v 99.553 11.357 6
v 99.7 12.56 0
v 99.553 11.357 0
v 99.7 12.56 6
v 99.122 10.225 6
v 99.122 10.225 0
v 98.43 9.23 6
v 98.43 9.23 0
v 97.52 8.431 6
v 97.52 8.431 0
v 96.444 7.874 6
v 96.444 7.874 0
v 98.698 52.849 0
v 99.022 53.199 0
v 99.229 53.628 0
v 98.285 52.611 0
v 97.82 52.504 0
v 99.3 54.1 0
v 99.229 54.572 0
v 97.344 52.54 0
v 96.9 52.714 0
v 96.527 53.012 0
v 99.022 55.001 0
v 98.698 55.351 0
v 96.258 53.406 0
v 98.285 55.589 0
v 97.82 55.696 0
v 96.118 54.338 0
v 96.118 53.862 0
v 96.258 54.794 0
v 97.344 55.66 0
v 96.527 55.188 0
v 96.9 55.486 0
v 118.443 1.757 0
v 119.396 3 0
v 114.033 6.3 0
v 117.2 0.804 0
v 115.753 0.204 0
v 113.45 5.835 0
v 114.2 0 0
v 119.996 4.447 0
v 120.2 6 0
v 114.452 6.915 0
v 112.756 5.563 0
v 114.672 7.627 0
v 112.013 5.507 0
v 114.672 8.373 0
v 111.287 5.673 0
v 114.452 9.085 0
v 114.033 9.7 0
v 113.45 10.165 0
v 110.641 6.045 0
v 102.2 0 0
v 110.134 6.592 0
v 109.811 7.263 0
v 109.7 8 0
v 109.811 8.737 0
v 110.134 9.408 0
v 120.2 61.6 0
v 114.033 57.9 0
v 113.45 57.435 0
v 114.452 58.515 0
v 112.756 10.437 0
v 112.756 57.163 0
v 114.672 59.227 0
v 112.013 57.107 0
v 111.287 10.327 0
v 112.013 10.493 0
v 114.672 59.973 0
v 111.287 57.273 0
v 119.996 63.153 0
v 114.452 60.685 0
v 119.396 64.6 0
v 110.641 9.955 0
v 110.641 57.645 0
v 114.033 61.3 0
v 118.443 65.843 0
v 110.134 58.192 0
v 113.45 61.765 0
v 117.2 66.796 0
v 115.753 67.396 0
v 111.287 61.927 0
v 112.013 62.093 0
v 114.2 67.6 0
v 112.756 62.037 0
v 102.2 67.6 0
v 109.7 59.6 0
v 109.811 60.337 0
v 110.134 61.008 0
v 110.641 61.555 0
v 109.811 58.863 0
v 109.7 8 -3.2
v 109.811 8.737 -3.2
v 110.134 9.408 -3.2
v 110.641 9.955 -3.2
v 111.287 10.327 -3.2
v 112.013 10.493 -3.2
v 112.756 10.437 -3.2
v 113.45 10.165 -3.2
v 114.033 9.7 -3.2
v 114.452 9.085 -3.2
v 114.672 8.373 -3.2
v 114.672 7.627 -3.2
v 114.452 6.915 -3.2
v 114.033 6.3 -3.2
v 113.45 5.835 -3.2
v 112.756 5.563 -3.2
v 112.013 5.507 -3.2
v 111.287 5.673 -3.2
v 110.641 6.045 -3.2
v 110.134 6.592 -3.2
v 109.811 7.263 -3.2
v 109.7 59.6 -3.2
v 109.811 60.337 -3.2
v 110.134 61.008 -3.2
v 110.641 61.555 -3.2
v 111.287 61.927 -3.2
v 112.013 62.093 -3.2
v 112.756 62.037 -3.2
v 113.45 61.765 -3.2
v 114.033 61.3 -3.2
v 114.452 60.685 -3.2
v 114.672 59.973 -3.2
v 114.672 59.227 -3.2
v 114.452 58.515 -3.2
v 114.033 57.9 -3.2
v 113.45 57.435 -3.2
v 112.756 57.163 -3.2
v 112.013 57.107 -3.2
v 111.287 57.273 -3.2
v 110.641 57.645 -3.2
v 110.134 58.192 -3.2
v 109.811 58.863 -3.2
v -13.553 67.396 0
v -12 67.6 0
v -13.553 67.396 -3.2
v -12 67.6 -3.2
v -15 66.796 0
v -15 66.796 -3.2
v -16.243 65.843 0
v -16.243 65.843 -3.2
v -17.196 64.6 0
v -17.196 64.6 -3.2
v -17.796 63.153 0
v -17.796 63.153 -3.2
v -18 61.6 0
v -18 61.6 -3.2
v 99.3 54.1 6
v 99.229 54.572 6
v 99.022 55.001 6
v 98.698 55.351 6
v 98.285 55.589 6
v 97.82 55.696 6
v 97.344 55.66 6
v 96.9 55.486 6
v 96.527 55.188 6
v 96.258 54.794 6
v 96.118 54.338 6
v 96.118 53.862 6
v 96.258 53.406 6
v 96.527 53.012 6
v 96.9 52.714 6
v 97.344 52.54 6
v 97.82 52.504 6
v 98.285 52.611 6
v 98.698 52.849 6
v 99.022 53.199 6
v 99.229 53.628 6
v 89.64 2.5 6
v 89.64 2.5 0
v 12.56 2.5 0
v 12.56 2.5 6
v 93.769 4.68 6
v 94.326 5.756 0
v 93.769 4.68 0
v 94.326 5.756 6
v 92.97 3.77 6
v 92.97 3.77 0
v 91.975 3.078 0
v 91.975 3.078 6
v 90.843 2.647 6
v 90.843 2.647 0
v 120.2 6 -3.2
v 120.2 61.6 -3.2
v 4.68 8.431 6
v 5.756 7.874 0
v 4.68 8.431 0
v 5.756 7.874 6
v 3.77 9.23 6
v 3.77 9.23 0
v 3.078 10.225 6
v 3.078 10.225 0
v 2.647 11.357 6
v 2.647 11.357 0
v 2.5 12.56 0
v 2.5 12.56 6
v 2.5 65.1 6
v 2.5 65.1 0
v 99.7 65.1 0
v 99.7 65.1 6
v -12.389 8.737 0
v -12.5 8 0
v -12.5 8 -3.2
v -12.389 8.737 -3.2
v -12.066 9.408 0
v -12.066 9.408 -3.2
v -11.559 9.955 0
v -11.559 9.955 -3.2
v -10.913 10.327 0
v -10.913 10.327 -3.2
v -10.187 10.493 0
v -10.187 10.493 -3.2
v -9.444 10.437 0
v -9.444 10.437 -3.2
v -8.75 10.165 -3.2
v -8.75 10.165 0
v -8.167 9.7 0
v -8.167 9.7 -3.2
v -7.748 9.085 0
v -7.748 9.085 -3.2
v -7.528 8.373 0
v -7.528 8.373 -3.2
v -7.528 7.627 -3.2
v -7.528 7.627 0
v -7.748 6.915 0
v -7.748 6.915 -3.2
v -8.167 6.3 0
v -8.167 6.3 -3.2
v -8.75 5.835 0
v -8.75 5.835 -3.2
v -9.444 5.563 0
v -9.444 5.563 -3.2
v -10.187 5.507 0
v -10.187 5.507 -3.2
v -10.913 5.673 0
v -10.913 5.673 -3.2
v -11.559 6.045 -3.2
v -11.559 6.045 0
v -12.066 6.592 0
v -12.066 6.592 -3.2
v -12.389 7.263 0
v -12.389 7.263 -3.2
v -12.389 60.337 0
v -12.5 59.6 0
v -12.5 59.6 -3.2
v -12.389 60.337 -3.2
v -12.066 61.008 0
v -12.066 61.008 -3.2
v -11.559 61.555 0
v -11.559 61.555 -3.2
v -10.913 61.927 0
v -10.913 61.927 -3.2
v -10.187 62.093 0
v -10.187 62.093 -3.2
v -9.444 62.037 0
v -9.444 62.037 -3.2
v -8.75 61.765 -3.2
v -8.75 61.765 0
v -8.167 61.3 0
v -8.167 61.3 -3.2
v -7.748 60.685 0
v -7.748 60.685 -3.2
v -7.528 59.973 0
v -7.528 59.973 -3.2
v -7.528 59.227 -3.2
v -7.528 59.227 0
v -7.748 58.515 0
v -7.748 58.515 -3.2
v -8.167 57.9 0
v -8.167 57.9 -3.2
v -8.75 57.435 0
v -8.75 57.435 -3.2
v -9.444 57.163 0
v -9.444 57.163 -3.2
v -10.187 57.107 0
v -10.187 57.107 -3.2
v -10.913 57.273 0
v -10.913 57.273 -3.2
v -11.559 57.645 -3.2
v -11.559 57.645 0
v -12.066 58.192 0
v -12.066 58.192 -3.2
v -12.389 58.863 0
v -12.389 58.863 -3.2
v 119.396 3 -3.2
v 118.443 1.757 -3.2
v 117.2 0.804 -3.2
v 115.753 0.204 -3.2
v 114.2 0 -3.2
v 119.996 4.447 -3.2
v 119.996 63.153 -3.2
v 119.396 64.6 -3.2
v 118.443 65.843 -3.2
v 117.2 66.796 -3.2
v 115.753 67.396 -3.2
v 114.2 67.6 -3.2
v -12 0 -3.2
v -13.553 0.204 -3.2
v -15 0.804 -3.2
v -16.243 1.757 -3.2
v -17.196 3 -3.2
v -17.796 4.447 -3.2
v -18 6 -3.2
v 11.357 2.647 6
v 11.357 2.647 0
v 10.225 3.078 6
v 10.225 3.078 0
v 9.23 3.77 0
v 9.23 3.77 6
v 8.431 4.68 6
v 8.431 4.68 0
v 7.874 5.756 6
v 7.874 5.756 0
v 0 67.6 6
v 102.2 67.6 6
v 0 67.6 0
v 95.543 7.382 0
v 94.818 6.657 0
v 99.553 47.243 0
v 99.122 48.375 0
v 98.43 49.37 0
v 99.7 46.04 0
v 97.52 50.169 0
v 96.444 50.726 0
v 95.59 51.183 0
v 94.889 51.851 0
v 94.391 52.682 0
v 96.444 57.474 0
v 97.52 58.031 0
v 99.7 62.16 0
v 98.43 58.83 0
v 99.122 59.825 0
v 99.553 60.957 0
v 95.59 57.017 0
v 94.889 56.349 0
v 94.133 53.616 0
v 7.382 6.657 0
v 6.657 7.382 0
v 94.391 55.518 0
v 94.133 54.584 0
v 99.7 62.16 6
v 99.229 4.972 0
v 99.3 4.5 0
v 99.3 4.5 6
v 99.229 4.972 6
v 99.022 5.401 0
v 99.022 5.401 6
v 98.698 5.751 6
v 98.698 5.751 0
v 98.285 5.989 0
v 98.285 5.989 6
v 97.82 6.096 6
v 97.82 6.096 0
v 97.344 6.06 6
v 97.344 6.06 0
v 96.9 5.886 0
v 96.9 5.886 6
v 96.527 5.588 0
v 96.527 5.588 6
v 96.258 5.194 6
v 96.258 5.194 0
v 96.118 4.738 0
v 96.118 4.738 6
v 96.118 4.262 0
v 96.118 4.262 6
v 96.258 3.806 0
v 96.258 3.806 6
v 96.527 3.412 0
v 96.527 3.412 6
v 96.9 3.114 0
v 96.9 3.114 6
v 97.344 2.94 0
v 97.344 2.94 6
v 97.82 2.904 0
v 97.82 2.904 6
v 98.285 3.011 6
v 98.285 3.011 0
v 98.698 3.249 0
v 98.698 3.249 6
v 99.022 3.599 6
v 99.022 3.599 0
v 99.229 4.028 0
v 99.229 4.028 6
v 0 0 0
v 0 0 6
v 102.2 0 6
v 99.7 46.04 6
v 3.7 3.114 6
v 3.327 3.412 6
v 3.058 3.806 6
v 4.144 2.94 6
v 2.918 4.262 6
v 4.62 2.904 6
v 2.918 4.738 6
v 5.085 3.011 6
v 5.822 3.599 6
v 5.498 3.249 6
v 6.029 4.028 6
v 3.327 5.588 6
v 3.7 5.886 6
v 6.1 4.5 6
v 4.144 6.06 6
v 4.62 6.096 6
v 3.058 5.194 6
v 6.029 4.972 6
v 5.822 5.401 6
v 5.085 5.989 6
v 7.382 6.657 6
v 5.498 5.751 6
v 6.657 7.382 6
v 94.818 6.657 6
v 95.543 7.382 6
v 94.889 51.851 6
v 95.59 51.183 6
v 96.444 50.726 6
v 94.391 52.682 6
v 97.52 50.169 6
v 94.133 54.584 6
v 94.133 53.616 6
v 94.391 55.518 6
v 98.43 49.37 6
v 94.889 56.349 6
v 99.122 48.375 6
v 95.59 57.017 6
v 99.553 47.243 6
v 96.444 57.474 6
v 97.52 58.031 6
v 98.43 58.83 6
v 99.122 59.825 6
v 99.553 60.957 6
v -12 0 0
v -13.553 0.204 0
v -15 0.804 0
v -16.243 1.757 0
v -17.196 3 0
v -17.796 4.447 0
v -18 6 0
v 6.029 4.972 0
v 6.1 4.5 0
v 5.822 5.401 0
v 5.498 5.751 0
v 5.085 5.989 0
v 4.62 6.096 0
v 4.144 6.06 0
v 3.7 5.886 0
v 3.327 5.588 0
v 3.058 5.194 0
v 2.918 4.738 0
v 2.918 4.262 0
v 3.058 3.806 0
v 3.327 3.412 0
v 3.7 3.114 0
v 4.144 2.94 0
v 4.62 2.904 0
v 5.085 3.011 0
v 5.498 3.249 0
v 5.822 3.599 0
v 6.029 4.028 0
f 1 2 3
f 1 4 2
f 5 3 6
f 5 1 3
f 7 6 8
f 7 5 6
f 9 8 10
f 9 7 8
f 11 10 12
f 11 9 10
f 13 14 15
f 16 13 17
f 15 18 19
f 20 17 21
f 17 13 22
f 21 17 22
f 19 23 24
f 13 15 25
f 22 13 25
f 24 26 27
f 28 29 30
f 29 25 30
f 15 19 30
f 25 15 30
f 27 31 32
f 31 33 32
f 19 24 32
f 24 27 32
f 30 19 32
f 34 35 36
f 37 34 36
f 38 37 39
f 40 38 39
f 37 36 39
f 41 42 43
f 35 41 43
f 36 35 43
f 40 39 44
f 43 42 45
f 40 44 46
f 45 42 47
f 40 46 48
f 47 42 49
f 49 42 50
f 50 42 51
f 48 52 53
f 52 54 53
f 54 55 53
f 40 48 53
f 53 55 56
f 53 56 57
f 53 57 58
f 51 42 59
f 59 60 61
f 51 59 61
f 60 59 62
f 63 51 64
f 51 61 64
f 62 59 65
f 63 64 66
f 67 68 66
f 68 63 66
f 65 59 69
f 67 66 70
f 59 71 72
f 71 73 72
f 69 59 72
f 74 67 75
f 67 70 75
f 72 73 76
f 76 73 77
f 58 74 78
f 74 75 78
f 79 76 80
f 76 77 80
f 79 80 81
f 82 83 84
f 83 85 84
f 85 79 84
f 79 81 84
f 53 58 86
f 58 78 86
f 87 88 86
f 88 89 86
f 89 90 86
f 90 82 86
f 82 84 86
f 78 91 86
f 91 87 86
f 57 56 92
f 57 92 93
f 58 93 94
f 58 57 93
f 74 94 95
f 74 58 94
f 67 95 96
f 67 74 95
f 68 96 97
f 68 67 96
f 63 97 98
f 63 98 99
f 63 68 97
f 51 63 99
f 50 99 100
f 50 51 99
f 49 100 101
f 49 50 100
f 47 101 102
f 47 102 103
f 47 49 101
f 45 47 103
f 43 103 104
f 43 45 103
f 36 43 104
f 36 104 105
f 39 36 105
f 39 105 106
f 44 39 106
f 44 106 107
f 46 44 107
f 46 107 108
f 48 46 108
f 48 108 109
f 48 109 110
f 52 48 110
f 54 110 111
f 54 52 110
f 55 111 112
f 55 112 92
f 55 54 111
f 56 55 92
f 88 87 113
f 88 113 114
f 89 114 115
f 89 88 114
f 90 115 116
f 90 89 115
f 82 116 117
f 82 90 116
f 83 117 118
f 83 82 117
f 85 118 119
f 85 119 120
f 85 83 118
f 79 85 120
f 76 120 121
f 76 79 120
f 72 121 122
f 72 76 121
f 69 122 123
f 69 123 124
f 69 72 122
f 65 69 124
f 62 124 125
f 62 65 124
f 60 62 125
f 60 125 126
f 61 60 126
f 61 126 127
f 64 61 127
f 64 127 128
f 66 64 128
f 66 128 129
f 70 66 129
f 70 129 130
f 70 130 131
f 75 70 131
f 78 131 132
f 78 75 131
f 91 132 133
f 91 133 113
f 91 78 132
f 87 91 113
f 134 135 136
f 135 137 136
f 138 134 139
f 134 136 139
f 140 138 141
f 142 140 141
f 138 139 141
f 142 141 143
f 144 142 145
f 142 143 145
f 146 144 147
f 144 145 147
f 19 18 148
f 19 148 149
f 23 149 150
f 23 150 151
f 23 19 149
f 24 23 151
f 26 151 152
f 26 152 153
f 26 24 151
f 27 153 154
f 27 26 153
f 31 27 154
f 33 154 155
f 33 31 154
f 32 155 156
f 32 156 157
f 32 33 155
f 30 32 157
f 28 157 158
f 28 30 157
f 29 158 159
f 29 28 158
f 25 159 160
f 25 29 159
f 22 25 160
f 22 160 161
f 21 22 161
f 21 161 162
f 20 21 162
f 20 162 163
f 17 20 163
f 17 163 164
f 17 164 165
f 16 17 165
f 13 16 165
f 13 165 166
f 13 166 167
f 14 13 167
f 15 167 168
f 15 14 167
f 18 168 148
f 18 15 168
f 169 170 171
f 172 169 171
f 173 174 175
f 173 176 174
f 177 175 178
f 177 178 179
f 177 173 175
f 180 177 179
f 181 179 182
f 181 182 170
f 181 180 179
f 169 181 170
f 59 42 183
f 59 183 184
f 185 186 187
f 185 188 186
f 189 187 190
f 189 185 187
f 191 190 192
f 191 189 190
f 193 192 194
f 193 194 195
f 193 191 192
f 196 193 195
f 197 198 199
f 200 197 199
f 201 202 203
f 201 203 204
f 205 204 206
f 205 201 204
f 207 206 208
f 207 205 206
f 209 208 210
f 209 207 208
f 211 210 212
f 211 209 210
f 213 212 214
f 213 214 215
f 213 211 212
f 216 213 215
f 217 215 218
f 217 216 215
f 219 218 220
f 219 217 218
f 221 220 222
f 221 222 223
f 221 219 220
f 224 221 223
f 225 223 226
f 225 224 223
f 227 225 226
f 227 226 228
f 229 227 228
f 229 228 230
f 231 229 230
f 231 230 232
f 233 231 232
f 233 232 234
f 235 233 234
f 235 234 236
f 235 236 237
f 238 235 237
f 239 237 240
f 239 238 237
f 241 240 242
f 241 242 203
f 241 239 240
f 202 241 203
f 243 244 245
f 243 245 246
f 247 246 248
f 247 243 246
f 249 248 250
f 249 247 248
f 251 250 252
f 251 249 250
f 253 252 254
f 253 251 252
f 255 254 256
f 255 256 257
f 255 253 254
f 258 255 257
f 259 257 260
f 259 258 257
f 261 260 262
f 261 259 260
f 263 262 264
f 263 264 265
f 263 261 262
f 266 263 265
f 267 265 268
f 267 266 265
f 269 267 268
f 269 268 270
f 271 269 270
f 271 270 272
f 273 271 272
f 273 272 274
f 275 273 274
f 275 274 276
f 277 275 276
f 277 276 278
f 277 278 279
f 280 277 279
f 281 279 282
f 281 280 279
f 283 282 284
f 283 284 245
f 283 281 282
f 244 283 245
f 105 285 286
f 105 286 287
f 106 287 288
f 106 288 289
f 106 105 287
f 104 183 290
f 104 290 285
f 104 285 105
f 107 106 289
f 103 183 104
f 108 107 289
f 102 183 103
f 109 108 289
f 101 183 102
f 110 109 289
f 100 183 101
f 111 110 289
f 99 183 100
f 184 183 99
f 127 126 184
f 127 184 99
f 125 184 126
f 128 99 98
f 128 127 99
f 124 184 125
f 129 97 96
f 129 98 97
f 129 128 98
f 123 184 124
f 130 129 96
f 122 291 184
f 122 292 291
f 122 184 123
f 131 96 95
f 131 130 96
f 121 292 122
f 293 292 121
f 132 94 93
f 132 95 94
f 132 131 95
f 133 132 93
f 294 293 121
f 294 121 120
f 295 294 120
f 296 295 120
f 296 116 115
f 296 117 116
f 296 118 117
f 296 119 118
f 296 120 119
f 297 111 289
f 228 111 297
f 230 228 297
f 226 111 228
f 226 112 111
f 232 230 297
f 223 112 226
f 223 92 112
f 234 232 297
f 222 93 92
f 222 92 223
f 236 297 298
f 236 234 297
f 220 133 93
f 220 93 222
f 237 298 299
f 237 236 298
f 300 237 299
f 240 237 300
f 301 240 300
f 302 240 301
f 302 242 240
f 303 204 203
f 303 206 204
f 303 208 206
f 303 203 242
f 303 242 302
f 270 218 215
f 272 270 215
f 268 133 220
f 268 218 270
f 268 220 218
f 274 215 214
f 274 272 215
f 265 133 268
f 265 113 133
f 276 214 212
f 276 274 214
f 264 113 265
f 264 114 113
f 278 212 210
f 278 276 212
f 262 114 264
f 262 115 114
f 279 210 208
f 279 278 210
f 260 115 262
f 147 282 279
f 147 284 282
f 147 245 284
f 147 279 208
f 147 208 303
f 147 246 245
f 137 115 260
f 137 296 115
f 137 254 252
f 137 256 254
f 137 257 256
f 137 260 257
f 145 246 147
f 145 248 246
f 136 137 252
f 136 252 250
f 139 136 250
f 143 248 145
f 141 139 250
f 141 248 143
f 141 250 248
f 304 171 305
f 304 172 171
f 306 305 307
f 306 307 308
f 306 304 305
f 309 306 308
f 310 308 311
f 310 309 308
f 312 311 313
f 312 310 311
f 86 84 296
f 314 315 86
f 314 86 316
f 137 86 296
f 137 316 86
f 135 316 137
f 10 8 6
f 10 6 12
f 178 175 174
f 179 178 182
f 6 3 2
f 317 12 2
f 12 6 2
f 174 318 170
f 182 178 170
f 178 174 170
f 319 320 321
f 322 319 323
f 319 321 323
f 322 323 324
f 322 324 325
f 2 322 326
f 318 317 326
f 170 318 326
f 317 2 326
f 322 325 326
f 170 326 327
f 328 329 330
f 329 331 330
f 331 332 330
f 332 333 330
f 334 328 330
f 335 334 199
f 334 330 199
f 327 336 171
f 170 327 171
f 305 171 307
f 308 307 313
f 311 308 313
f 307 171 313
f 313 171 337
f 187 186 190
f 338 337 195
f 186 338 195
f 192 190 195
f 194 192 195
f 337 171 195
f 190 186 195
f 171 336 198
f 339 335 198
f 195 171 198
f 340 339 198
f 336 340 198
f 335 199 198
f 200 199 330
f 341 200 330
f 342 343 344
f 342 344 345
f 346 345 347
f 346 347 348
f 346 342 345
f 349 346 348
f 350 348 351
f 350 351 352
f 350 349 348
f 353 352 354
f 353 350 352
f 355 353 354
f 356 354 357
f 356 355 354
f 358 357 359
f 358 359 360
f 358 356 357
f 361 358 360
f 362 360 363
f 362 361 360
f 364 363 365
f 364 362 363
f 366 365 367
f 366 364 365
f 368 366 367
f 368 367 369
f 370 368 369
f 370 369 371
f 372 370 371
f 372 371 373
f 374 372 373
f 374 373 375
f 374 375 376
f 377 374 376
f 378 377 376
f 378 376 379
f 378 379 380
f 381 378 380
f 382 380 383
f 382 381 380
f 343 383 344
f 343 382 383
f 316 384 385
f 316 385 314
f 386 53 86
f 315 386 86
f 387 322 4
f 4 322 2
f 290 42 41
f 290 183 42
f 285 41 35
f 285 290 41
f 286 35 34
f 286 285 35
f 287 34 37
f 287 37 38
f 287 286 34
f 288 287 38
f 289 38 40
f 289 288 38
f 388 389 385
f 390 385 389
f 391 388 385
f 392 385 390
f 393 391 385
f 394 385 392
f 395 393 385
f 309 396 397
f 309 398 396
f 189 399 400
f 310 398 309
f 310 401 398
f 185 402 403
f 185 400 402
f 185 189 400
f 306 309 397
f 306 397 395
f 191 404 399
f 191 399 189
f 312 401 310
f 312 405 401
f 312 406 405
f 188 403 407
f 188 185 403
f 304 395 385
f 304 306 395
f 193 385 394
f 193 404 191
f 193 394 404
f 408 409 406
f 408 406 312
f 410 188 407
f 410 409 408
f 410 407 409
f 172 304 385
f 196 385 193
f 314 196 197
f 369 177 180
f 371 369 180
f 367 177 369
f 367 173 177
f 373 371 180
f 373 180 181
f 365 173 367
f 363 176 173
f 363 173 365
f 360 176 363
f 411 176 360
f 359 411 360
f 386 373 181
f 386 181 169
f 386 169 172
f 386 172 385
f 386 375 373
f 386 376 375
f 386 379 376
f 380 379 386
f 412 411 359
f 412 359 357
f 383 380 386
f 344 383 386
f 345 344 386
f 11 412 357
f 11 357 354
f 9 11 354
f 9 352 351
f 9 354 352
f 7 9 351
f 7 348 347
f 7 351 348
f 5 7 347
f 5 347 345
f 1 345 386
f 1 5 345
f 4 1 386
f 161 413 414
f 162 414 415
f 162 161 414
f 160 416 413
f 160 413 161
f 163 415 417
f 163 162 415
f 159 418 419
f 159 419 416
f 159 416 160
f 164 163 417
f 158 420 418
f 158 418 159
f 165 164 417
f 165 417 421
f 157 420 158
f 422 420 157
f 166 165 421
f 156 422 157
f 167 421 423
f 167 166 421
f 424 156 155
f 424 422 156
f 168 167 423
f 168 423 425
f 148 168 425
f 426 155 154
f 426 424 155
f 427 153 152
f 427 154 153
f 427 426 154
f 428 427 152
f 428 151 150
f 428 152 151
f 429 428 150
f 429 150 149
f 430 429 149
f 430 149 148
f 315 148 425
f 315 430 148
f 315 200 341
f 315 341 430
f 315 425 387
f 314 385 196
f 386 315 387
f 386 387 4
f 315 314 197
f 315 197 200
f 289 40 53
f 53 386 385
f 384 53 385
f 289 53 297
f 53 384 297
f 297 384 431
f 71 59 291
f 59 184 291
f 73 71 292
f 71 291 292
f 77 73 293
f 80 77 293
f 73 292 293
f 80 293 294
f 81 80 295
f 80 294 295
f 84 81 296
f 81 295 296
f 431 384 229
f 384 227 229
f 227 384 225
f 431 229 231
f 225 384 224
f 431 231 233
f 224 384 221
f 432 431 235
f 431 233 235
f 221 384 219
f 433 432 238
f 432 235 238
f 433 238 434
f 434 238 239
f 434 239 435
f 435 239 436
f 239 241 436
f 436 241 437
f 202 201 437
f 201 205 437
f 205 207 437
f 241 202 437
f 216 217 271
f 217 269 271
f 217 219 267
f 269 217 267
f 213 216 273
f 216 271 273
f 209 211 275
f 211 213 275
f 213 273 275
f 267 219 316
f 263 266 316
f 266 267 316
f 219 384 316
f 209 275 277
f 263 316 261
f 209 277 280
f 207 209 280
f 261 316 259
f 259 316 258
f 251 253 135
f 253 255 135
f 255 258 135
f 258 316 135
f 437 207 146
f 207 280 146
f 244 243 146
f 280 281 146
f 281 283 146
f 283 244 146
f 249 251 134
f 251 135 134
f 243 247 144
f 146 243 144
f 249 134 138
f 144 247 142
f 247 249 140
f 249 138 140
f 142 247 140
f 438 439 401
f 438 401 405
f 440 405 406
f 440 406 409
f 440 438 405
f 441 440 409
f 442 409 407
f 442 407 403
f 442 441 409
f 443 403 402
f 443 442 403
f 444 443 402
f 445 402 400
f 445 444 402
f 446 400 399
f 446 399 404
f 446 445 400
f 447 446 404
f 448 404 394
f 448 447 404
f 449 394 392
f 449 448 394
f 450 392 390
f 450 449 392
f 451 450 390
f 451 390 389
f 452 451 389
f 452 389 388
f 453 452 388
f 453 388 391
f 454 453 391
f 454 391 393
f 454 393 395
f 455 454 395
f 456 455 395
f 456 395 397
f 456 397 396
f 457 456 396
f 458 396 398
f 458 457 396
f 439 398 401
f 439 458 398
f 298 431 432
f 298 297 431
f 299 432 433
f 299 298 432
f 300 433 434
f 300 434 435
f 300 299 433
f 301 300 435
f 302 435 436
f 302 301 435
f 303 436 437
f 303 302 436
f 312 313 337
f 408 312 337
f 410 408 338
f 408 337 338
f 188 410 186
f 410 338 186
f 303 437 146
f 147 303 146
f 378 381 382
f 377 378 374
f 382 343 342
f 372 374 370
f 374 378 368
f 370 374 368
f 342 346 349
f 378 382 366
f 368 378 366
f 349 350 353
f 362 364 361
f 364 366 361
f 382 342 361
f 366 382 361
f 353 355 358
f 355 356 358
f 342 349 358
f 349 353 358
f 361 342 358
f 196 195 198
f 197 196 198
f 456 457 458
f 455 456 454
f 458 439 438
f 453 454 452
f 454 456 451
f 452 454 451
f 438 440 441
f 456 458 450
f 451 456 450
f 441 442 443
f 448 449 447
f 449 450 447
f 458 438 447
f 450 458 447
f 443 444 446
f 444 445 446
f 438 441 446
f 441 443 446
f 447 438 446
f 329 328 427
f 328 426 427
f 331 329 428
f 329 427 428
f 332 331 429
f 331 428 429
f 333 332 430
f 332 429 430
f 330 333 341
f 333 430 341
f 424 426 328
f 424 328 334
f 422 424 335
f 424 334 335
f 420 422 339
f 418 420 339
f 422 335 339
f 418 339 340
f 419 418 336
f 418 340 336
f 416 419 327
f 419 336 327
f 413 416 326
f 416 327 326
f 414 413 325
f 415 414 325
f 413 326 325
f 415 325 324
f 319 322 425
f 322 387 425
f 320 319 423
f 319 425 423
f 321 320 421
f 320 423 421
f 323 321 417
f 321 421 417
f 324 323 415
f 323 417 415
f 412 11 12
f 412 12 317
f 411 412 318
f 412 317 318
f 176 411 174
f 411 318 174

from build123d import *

# Parameters (mm, degrees)
SKETCH1_W           = 102.2
SKETCH1_H           = 67.6
SKETCH1_R           = 1.6
BOSS_EXTRUDE1_DEPTH = 6
SKETCH2_W           = 138.2
SKETCH2_H           = 67.6
SKETCH2_R           = 2.5
BOSS_EXTRUDE2_DEPTH = 3.2
FILLET1_R           = 6
FILLET2_R           = 5
FILLET3_R           = 5


with BuildPart() as part:
    # Sketch1 → Boss-Extrude1 (new body)
    with BuildSketch(Plane.XY):
        with Locations((51.1, 33.8)):
            Rectangle(SKETCH1_W, SKETCH1_H)
        with BuildLine():
            Line((94.706674091, 2.5), (7.493325909, 2.5))
            ThreePointArc((7.493325909, 2.5), (7.045584412, 7.045584412), (2.5, 7.493325909))
            Line((2.5, 7.493325909), (2.5, 65.1))
            Line((2.5, 65.1), (99.7, 65.1))
            Line((99.7, 65.1), (99.7, 57.093325909))
            ThreePointArc((99.7, 57.093325909), (94.1, 54.1), (99.7, 51.106674091))
            Line((99.7, 51.106674091), (99.7, 7.493325909))
            ThreePointArc((99.7, 7.493325909), (95.154415588, 7.045584412), (94.706674091, 2.5))
        make_face(mode=Mode.SUBTRACT)
        with Locations((4.5, 4.5)):
            Circle(SKETCH1_R, mode=Mode.SUBTRACT)
        with Locations((97.7, 4.5)):
            Circle(SKETCH1_R, mode=Mode.SUBTRACT)
        with Locations((97.7, 54.1)):
            Circle(SKETCH1_R, mode=Mode.SUBTRACT)
    extrude(amount=BOSS_EXTRUDE1_DEPTH)

    # Sketch2 → Boss-Extrude2 (add)
    with BuildSketch(Plane(origin=(0, 0, 0), x_dir=(-1, 0, 0), z_dir=(0, 0, -1))):
        with Locations((-51.1, 33.8)):
            Rectangle(SKETCH2_W, SKETCH2_H)
        with Locations((-112.2, 59.6)):
            Circle(SKETCH2_R, mode=Mode.SUBTRACT)
        with Locations((-112.2, 8)):
            Circle(SKETCH2_R, mode=Mode.SUBTRACT)
        with Locations((10, 8)):
            Circle(SKETCH2_R, mode=Mode.SUBTRACT)
        with Locations((10, 59.6)):
            Circle(SKETCH2_R, mode=Mode.SUBTRACT)
    extrude(amount=BOSS_EXTRUDE2_DEPTH)

    # Fillet1
    fillet1_edges = [part.edges().sort_by_distance(p)[0] for p in [
        (120.2, 67.6, -1.6),
        (120.2, 0, -1.6),
        (-18, 0, -1.6),
        (-18, 67.6, -1.6),
    ]]
    fillet(fillet1_edges, radius=FILLET1_R)

    # Fillet2
    fillet2_edges = [part.edges().sort_by_distance(p)[0] for p in [
        (99.7, 51.106674091, 3),
        (99.7, 57.093325909, 3),
    ]]
    fillet(fillet2_edges, radius=FILLET2_R)

    # Fillet3
    fillet3_edges = [part.edges().sort_by_distance(p)[0] for p in [
        (7.493325909, 2.5, 3),
        (94.706674091, 2.5, 3),
        (99.7, 7.493325909, 3),
        (2.5, 7.493325909, 3),
    ]]
    fillet(fillet3_edges, radius=FILLET3_R)


solid = part.part
